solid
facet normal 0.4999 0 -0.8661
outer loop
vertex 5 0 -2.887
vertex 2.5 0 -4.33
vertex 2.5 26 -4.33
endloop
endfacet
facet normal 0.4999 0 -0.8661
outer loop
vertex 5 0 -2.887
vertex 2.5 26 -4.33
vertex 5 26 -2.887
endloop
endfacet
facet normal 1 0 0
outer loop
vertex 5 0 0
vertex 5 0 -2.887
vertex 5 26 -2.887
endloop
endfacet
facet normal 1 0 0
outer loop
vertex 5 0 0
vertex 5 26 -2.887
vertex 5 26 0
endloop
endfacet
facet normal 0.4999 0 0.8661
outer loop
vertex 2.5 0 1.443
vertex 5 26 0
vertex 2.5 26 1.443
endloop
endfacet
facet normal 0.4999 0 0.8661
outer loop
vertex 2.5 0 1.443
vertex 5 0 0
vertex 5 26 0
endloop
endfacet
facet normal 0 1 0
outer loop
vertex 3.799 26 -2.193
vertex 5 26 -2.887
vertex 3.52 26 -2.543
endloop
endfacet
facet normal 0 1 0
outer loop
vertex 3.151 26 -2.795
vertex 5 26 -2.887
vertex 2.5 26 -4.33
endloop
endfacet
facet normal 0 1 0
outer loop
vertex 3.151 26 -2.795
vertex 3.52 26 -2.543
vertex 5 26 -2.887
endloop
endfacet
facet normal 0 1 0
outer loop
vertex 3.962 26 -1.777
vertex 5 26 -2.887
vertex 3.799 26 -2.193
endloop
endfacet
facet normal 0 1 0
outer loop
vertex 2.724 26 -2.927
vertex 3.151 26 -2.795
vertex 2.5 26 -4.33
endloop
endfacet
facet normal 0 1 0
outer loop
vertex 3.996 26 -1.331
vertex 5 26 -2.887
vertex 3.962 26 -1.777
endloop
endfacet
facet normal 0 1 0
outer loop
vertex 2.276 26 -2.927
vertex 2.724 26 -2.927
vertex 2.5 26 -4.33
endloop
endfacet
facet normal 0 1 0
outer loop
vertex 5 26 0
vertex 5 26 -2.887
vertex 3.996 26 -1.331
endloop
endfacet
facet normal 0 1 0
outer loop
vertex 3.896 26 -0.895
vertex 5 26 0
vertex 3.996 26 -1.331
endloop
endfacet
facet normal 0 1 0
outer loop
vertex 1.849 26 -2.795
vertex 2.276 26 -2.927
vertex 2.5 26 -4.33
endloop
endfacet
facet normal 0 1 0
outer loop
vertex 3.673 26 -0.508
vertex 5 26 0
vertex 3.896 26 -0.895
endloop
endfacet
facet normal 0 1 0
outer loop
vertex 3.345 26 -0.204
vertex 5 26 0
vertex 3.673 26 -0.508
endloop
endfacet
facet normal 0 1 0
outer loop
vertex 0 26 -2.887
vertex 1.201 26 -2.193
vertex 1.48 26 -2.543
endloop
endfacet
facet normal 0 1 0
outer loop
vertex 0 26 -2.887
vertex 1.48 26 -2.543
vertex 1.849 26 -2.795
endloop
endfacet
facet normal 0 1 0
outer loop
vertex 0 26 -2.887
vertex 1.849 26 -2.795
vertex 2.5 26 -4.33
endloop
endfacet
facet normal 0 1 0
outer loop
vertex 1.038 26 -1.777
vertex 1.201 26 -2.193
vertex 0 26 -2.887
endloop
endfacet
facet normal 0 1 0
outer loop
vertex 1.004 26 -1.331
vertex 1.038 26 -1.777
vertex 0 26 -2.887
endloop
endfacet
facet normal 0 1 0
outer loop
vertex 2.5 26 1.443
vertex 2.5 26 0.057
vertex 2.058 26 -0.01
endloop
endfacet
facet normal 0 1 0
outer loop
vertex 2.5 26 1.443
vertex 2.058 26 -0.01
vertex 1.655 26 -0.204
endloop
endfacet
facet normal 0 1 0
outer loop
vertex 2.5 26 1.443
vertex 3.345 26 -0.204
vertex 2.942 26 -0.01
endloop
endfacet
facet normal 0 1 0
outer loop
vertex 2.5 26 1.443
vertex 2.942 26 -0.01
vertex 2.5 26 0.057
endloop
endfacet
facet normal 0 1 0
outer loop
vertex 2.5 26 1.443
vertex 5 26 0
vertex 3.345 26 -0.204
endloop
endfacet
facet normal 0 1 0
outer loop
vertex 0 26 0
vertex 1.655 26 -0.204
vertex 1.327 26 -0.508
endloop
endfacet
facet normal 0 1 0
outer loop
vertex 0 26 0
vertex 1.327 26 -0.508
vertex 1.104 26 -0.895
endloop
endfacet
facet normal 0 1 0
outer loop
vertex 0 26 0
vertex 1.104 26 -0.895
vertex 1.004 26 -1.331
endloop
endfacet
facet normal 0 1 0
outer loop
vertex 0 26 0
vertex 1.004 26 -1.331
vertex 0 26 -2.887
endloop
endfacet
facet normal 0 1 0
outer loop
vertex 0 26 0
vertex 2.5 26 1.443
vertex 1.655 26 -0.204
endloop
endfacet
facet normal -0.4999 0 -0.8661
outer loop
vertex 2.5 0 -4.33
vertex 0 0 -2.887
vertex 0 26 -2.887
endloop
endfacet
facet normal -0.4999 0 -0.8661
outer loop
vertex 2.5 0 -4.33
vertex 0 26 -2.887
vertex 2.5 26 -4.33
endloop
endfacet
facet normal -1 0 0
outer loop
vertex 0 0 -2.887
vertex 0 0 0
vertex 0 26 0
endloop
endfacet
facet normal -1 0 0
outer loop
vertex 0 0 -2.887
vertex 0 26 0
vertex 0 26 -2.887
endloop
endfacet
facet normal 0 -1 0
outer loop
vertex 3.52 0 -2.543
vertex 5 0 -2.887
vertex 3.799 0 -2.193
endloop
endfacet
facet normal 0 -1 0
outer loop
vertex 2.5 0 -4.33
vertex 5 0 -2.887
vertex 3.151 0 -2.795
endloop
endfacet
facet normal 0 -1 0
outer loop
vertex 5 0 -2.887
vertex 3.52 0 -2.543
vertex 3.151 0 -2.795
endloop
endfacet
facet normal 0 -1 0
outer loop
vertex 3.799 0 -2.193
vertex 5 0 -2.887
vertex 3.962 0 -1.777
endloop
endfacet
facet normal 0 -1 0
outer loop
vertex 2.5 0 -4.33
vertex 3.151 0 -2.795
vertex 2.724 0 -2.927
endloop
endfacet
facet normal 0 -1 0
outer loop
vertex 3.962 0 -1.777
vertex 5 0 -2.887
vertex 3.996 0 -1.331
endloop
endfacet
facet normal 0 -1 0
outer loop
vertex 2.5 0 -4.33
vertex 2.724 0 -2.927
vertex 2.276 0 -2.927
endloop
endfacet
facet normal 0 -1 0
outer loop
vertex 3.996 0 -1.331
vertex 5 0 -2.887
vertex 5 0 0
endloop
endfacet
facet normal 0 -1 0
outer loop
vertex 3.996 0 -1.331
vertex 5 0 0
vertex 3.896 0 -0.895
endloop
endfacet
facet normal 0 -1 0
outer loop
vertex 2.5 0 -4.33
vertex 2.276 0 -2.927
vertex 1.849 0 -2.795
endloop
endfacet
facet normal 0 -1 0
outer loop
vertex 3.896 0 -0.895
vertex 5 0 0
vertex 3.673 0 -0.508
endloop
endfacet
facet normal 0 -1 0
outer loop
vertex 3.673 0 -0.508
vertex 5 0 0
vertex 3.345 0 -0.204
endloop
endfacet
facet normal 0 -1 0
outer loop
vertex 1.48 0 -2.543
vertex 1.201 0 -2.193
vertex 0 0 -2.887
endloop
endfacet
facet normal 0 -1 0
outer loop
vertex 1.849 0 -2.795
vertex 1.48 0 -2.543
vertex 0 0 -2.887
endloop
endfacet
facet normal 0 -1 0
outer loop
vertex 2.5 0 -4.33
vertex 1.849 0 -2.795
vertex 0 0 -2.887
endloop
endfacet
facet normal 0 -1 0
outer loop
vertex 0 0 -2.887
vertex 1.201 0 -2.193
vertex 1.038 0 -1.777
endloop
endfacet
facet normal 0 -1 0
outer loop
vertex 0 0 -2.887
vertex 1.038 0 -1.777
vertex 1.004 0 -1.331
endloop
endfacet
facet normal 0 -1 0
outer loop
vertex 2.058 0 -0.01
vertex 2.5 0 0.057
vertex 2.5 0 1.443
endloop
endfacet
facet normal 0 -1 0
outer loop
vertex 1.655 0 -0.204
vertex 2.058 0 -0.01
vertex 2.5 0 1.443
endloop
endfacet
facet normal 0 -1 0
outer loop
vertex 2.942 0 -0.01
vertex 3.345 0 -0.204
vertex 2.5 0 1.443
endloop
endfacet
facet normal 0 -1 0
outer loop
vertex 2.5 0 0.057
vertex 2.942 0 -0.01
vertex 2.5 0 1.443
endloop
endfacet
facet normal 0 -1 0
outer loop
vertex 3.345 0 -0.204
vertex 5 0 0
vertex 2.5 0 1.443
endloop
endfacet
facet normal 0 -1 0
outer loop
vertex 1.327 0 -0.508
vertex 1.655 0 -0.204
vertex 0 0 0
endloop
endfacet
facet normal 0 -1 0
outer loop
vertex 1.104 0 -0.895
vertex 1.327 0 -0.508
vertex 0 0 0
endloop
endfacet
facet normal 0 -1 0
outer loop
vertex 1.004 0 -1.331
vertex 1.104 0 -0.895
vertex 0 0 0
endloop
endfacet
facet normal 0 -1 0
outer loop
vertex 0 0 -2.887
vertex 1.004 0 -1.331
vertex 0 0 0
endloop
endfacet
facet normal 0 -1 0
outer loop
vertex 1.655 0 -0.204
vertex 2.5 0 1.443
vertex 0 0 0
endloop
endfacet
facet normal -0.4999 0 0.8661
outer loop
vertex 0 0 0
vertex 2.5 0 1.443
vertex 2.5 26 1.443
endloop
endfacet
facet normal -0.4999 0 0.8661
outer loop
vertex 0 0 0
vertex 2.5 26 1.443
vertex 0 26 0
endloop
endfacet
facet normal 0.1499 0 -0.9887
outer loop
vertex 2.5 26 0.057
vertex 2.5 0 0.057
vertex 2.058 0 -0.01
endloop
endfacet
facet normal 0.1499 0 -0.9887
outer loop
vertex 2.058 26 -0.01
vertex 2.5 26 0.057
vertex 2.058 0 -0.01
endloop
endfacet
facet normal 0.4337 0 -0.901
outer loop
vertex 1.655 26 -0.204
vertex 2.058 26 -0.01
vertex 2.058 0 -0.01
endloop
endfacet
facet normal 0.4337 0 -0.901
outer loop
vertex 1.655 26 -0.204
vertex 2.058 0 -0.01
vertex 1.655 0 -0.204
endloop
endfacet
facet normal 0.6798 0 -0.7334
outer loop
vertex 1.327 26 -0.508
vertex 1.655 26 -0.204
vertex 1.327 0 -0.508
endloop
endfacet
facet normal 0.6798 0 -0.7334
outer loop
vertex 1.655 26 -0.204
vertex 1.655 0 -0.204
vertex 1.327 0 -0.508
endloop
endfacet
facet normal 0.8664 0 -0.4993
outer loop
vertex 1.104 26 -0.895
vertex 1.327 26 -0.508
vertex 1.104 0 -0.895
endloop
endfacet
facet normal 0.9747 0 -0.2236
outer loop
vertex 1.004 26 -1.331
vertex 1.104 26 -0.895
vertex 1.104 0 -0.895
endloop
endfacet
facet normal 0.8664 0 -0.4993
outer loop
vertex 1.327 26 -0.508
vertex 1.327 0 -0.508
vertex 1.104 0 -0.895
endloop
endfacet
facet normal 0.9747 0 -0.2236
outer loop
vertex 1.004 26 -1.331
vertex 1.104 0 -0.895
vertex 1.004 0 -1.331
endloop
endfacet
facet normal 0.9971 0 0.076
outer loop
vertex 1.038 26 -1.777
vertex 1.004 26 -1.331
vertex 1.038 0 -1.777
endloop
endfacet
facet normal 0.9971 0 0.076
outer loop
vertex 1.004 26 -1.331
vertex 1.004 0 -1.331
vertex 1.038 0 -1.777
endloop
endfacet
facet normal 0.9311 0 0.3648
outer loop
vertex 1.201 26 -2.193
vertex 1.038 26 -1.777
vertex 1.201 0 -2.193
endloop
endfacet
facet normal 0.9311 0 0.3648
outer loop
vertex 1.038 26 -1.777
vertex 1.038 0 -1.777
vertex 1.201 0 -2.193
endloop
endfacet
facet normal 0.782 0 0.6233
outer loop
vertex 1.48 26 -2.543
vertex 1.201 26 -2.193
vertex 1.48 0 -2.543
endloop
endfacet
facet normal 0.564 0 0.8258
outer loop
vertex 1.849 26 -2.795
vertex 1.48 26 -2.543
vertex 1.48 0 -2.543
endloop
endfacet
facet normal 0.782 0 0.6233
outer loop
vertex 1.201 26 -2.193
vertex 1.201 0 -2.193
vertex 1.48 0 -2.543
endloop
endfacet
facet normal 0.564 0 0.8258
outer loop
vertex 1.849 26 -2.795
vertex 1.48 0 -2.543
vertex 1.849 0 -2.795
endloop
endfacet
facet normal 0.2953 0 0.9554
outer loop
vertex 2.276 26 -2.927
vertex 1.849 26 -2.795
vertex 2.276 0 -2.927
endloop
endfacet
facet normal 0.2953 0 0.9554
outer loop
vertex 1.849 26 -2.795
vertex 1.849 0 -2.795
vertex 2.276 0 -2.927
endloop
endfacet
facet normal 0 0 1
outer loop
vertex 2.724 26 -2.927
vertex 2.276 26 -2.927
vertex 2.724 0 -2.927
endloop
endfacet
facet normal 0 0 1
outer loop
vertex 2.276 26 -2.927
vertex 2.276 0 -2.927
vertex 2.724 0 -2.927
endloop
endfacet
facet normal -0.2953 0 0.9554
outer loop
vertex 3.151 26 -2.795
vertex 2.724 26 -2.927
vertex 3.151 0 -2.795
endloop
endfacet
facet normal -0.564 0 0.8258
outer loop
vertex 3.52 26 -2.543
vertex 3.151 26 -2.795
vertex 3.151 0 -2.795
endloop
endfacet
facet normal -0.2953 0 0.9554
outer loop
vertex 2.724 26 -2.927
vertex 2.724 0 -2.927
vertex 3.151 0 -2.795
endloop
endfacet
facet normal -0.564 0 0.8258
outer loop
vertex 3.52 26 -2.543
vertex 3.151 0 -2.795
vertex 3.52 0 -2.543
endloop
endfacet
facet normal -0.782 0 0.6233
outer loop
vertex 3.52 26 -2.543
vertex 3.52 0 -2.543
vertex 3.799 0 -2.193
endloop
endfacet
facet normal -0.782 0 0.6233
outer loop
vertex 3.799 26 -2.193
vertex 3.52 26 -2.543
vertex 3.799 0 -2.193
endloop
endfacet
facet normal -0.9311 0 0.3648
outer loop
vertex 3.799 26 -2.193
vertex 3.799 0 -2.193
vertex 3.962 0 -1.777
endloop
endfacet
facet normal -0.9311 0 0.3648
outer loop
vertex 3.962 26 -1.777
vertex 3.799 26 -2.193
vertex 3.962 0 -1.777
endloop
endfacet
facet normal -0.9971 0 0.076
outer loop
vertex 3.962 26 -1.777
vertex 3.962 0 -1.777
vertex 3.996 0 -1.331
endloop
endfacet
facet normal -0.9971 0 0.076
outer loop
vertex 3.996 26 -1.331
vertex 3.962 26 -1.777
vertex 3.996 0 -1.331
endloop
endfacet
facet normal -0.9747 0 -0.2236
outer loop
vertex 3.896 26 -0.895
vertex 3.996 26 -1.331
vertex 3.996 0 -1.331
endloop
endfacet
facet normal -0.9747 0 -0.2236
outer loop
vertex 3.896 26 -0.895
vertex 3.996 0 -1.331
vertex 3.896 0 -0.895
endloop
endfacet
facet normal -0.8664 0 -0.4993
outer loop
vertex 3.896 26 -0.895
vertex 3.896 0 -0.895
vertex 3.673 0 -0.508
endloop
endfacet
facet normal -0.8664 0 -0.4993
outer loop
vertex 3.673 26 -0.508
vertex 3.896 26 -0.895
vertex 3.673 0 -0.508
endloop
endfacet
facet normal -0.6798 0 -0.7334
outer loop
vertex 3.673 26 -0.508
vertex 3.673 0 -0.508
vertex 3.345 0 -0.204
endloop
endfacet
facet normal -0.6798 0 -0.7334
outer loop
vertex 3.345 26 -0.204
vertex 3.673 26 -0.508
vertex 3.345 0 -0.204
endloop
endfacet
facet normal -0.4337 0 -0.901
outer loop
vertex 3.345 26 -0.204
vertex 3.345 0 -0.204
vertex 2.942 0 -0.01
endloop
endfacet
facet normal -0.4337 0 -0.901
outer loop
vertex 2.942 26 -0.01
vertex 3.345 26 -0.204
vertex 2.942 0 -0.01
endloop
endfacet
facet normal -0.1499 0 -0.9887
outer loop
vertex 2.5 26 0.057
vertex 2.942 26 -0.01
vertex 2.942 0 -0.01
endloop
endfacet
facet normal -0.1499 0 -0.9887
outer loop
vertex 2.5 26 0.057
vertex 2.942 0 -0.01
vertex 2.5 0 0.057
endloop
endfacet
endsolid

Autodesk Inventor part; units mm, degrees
ref_plane "YZ Plane" through (0, 0, 0) normal (1, 0, 0) x (0, 1, 0)
ref_plane "XY Plane" through (0, 0, 0) normal (0, 0, 1) x (1, 0, 0)
sketch "Skizze1" plane through (0, 0, 0) normal (0, 1, 0) x (-1, 0, 0)
  line L0 (0, 0) -> (0, -2.8868)
  line L1 (0, -2.8868) -> (-2.5, -4.3301)
  line L2 (-2.5, -4.3301) -> (-5, -2.8868)
  line L3 (-5, -2.8868) -> (-5, 0)
  line L4 (-5, 0) -> (-2.5, 1.4434)
  line L5 (-2.5, 1.4434) -> (0, 0)
  dimension "d2" = 120
  dimension "d4" = 120
  dimension "d6" = 120
  dimension "d8" = 120
  dimension "d11" = 5
  dimension "d12" = 5
  dimension "d13" = 5
extrude "Extrusion1" add sketch "Skizze1" along normal blind 26
sketch "Skizze2" plane through (0, 26, 0) normal (0, 1, 0) x (1, 0, 0)
  line L0 (0, 2.8868) -> (0, 0) projected
  line L1 (5, 0) -> (5, 2.8868) projected
  line L2 (0, 0) -> (5, 2.8868) construction
  line L3 (0, 2.8868) -> (5, 0) construction
  point P0 (2.5, 1.4434)
hole "Bohrung1" at (2.5, 26, -1.4434) direction (0, -1, 0) diameter 3 end through all
thread "Gewinde1" size "M3x0.5" class "6H" standard "ANSI Metric M Profile" full length
properties part number "abstandshalter_26mm"
